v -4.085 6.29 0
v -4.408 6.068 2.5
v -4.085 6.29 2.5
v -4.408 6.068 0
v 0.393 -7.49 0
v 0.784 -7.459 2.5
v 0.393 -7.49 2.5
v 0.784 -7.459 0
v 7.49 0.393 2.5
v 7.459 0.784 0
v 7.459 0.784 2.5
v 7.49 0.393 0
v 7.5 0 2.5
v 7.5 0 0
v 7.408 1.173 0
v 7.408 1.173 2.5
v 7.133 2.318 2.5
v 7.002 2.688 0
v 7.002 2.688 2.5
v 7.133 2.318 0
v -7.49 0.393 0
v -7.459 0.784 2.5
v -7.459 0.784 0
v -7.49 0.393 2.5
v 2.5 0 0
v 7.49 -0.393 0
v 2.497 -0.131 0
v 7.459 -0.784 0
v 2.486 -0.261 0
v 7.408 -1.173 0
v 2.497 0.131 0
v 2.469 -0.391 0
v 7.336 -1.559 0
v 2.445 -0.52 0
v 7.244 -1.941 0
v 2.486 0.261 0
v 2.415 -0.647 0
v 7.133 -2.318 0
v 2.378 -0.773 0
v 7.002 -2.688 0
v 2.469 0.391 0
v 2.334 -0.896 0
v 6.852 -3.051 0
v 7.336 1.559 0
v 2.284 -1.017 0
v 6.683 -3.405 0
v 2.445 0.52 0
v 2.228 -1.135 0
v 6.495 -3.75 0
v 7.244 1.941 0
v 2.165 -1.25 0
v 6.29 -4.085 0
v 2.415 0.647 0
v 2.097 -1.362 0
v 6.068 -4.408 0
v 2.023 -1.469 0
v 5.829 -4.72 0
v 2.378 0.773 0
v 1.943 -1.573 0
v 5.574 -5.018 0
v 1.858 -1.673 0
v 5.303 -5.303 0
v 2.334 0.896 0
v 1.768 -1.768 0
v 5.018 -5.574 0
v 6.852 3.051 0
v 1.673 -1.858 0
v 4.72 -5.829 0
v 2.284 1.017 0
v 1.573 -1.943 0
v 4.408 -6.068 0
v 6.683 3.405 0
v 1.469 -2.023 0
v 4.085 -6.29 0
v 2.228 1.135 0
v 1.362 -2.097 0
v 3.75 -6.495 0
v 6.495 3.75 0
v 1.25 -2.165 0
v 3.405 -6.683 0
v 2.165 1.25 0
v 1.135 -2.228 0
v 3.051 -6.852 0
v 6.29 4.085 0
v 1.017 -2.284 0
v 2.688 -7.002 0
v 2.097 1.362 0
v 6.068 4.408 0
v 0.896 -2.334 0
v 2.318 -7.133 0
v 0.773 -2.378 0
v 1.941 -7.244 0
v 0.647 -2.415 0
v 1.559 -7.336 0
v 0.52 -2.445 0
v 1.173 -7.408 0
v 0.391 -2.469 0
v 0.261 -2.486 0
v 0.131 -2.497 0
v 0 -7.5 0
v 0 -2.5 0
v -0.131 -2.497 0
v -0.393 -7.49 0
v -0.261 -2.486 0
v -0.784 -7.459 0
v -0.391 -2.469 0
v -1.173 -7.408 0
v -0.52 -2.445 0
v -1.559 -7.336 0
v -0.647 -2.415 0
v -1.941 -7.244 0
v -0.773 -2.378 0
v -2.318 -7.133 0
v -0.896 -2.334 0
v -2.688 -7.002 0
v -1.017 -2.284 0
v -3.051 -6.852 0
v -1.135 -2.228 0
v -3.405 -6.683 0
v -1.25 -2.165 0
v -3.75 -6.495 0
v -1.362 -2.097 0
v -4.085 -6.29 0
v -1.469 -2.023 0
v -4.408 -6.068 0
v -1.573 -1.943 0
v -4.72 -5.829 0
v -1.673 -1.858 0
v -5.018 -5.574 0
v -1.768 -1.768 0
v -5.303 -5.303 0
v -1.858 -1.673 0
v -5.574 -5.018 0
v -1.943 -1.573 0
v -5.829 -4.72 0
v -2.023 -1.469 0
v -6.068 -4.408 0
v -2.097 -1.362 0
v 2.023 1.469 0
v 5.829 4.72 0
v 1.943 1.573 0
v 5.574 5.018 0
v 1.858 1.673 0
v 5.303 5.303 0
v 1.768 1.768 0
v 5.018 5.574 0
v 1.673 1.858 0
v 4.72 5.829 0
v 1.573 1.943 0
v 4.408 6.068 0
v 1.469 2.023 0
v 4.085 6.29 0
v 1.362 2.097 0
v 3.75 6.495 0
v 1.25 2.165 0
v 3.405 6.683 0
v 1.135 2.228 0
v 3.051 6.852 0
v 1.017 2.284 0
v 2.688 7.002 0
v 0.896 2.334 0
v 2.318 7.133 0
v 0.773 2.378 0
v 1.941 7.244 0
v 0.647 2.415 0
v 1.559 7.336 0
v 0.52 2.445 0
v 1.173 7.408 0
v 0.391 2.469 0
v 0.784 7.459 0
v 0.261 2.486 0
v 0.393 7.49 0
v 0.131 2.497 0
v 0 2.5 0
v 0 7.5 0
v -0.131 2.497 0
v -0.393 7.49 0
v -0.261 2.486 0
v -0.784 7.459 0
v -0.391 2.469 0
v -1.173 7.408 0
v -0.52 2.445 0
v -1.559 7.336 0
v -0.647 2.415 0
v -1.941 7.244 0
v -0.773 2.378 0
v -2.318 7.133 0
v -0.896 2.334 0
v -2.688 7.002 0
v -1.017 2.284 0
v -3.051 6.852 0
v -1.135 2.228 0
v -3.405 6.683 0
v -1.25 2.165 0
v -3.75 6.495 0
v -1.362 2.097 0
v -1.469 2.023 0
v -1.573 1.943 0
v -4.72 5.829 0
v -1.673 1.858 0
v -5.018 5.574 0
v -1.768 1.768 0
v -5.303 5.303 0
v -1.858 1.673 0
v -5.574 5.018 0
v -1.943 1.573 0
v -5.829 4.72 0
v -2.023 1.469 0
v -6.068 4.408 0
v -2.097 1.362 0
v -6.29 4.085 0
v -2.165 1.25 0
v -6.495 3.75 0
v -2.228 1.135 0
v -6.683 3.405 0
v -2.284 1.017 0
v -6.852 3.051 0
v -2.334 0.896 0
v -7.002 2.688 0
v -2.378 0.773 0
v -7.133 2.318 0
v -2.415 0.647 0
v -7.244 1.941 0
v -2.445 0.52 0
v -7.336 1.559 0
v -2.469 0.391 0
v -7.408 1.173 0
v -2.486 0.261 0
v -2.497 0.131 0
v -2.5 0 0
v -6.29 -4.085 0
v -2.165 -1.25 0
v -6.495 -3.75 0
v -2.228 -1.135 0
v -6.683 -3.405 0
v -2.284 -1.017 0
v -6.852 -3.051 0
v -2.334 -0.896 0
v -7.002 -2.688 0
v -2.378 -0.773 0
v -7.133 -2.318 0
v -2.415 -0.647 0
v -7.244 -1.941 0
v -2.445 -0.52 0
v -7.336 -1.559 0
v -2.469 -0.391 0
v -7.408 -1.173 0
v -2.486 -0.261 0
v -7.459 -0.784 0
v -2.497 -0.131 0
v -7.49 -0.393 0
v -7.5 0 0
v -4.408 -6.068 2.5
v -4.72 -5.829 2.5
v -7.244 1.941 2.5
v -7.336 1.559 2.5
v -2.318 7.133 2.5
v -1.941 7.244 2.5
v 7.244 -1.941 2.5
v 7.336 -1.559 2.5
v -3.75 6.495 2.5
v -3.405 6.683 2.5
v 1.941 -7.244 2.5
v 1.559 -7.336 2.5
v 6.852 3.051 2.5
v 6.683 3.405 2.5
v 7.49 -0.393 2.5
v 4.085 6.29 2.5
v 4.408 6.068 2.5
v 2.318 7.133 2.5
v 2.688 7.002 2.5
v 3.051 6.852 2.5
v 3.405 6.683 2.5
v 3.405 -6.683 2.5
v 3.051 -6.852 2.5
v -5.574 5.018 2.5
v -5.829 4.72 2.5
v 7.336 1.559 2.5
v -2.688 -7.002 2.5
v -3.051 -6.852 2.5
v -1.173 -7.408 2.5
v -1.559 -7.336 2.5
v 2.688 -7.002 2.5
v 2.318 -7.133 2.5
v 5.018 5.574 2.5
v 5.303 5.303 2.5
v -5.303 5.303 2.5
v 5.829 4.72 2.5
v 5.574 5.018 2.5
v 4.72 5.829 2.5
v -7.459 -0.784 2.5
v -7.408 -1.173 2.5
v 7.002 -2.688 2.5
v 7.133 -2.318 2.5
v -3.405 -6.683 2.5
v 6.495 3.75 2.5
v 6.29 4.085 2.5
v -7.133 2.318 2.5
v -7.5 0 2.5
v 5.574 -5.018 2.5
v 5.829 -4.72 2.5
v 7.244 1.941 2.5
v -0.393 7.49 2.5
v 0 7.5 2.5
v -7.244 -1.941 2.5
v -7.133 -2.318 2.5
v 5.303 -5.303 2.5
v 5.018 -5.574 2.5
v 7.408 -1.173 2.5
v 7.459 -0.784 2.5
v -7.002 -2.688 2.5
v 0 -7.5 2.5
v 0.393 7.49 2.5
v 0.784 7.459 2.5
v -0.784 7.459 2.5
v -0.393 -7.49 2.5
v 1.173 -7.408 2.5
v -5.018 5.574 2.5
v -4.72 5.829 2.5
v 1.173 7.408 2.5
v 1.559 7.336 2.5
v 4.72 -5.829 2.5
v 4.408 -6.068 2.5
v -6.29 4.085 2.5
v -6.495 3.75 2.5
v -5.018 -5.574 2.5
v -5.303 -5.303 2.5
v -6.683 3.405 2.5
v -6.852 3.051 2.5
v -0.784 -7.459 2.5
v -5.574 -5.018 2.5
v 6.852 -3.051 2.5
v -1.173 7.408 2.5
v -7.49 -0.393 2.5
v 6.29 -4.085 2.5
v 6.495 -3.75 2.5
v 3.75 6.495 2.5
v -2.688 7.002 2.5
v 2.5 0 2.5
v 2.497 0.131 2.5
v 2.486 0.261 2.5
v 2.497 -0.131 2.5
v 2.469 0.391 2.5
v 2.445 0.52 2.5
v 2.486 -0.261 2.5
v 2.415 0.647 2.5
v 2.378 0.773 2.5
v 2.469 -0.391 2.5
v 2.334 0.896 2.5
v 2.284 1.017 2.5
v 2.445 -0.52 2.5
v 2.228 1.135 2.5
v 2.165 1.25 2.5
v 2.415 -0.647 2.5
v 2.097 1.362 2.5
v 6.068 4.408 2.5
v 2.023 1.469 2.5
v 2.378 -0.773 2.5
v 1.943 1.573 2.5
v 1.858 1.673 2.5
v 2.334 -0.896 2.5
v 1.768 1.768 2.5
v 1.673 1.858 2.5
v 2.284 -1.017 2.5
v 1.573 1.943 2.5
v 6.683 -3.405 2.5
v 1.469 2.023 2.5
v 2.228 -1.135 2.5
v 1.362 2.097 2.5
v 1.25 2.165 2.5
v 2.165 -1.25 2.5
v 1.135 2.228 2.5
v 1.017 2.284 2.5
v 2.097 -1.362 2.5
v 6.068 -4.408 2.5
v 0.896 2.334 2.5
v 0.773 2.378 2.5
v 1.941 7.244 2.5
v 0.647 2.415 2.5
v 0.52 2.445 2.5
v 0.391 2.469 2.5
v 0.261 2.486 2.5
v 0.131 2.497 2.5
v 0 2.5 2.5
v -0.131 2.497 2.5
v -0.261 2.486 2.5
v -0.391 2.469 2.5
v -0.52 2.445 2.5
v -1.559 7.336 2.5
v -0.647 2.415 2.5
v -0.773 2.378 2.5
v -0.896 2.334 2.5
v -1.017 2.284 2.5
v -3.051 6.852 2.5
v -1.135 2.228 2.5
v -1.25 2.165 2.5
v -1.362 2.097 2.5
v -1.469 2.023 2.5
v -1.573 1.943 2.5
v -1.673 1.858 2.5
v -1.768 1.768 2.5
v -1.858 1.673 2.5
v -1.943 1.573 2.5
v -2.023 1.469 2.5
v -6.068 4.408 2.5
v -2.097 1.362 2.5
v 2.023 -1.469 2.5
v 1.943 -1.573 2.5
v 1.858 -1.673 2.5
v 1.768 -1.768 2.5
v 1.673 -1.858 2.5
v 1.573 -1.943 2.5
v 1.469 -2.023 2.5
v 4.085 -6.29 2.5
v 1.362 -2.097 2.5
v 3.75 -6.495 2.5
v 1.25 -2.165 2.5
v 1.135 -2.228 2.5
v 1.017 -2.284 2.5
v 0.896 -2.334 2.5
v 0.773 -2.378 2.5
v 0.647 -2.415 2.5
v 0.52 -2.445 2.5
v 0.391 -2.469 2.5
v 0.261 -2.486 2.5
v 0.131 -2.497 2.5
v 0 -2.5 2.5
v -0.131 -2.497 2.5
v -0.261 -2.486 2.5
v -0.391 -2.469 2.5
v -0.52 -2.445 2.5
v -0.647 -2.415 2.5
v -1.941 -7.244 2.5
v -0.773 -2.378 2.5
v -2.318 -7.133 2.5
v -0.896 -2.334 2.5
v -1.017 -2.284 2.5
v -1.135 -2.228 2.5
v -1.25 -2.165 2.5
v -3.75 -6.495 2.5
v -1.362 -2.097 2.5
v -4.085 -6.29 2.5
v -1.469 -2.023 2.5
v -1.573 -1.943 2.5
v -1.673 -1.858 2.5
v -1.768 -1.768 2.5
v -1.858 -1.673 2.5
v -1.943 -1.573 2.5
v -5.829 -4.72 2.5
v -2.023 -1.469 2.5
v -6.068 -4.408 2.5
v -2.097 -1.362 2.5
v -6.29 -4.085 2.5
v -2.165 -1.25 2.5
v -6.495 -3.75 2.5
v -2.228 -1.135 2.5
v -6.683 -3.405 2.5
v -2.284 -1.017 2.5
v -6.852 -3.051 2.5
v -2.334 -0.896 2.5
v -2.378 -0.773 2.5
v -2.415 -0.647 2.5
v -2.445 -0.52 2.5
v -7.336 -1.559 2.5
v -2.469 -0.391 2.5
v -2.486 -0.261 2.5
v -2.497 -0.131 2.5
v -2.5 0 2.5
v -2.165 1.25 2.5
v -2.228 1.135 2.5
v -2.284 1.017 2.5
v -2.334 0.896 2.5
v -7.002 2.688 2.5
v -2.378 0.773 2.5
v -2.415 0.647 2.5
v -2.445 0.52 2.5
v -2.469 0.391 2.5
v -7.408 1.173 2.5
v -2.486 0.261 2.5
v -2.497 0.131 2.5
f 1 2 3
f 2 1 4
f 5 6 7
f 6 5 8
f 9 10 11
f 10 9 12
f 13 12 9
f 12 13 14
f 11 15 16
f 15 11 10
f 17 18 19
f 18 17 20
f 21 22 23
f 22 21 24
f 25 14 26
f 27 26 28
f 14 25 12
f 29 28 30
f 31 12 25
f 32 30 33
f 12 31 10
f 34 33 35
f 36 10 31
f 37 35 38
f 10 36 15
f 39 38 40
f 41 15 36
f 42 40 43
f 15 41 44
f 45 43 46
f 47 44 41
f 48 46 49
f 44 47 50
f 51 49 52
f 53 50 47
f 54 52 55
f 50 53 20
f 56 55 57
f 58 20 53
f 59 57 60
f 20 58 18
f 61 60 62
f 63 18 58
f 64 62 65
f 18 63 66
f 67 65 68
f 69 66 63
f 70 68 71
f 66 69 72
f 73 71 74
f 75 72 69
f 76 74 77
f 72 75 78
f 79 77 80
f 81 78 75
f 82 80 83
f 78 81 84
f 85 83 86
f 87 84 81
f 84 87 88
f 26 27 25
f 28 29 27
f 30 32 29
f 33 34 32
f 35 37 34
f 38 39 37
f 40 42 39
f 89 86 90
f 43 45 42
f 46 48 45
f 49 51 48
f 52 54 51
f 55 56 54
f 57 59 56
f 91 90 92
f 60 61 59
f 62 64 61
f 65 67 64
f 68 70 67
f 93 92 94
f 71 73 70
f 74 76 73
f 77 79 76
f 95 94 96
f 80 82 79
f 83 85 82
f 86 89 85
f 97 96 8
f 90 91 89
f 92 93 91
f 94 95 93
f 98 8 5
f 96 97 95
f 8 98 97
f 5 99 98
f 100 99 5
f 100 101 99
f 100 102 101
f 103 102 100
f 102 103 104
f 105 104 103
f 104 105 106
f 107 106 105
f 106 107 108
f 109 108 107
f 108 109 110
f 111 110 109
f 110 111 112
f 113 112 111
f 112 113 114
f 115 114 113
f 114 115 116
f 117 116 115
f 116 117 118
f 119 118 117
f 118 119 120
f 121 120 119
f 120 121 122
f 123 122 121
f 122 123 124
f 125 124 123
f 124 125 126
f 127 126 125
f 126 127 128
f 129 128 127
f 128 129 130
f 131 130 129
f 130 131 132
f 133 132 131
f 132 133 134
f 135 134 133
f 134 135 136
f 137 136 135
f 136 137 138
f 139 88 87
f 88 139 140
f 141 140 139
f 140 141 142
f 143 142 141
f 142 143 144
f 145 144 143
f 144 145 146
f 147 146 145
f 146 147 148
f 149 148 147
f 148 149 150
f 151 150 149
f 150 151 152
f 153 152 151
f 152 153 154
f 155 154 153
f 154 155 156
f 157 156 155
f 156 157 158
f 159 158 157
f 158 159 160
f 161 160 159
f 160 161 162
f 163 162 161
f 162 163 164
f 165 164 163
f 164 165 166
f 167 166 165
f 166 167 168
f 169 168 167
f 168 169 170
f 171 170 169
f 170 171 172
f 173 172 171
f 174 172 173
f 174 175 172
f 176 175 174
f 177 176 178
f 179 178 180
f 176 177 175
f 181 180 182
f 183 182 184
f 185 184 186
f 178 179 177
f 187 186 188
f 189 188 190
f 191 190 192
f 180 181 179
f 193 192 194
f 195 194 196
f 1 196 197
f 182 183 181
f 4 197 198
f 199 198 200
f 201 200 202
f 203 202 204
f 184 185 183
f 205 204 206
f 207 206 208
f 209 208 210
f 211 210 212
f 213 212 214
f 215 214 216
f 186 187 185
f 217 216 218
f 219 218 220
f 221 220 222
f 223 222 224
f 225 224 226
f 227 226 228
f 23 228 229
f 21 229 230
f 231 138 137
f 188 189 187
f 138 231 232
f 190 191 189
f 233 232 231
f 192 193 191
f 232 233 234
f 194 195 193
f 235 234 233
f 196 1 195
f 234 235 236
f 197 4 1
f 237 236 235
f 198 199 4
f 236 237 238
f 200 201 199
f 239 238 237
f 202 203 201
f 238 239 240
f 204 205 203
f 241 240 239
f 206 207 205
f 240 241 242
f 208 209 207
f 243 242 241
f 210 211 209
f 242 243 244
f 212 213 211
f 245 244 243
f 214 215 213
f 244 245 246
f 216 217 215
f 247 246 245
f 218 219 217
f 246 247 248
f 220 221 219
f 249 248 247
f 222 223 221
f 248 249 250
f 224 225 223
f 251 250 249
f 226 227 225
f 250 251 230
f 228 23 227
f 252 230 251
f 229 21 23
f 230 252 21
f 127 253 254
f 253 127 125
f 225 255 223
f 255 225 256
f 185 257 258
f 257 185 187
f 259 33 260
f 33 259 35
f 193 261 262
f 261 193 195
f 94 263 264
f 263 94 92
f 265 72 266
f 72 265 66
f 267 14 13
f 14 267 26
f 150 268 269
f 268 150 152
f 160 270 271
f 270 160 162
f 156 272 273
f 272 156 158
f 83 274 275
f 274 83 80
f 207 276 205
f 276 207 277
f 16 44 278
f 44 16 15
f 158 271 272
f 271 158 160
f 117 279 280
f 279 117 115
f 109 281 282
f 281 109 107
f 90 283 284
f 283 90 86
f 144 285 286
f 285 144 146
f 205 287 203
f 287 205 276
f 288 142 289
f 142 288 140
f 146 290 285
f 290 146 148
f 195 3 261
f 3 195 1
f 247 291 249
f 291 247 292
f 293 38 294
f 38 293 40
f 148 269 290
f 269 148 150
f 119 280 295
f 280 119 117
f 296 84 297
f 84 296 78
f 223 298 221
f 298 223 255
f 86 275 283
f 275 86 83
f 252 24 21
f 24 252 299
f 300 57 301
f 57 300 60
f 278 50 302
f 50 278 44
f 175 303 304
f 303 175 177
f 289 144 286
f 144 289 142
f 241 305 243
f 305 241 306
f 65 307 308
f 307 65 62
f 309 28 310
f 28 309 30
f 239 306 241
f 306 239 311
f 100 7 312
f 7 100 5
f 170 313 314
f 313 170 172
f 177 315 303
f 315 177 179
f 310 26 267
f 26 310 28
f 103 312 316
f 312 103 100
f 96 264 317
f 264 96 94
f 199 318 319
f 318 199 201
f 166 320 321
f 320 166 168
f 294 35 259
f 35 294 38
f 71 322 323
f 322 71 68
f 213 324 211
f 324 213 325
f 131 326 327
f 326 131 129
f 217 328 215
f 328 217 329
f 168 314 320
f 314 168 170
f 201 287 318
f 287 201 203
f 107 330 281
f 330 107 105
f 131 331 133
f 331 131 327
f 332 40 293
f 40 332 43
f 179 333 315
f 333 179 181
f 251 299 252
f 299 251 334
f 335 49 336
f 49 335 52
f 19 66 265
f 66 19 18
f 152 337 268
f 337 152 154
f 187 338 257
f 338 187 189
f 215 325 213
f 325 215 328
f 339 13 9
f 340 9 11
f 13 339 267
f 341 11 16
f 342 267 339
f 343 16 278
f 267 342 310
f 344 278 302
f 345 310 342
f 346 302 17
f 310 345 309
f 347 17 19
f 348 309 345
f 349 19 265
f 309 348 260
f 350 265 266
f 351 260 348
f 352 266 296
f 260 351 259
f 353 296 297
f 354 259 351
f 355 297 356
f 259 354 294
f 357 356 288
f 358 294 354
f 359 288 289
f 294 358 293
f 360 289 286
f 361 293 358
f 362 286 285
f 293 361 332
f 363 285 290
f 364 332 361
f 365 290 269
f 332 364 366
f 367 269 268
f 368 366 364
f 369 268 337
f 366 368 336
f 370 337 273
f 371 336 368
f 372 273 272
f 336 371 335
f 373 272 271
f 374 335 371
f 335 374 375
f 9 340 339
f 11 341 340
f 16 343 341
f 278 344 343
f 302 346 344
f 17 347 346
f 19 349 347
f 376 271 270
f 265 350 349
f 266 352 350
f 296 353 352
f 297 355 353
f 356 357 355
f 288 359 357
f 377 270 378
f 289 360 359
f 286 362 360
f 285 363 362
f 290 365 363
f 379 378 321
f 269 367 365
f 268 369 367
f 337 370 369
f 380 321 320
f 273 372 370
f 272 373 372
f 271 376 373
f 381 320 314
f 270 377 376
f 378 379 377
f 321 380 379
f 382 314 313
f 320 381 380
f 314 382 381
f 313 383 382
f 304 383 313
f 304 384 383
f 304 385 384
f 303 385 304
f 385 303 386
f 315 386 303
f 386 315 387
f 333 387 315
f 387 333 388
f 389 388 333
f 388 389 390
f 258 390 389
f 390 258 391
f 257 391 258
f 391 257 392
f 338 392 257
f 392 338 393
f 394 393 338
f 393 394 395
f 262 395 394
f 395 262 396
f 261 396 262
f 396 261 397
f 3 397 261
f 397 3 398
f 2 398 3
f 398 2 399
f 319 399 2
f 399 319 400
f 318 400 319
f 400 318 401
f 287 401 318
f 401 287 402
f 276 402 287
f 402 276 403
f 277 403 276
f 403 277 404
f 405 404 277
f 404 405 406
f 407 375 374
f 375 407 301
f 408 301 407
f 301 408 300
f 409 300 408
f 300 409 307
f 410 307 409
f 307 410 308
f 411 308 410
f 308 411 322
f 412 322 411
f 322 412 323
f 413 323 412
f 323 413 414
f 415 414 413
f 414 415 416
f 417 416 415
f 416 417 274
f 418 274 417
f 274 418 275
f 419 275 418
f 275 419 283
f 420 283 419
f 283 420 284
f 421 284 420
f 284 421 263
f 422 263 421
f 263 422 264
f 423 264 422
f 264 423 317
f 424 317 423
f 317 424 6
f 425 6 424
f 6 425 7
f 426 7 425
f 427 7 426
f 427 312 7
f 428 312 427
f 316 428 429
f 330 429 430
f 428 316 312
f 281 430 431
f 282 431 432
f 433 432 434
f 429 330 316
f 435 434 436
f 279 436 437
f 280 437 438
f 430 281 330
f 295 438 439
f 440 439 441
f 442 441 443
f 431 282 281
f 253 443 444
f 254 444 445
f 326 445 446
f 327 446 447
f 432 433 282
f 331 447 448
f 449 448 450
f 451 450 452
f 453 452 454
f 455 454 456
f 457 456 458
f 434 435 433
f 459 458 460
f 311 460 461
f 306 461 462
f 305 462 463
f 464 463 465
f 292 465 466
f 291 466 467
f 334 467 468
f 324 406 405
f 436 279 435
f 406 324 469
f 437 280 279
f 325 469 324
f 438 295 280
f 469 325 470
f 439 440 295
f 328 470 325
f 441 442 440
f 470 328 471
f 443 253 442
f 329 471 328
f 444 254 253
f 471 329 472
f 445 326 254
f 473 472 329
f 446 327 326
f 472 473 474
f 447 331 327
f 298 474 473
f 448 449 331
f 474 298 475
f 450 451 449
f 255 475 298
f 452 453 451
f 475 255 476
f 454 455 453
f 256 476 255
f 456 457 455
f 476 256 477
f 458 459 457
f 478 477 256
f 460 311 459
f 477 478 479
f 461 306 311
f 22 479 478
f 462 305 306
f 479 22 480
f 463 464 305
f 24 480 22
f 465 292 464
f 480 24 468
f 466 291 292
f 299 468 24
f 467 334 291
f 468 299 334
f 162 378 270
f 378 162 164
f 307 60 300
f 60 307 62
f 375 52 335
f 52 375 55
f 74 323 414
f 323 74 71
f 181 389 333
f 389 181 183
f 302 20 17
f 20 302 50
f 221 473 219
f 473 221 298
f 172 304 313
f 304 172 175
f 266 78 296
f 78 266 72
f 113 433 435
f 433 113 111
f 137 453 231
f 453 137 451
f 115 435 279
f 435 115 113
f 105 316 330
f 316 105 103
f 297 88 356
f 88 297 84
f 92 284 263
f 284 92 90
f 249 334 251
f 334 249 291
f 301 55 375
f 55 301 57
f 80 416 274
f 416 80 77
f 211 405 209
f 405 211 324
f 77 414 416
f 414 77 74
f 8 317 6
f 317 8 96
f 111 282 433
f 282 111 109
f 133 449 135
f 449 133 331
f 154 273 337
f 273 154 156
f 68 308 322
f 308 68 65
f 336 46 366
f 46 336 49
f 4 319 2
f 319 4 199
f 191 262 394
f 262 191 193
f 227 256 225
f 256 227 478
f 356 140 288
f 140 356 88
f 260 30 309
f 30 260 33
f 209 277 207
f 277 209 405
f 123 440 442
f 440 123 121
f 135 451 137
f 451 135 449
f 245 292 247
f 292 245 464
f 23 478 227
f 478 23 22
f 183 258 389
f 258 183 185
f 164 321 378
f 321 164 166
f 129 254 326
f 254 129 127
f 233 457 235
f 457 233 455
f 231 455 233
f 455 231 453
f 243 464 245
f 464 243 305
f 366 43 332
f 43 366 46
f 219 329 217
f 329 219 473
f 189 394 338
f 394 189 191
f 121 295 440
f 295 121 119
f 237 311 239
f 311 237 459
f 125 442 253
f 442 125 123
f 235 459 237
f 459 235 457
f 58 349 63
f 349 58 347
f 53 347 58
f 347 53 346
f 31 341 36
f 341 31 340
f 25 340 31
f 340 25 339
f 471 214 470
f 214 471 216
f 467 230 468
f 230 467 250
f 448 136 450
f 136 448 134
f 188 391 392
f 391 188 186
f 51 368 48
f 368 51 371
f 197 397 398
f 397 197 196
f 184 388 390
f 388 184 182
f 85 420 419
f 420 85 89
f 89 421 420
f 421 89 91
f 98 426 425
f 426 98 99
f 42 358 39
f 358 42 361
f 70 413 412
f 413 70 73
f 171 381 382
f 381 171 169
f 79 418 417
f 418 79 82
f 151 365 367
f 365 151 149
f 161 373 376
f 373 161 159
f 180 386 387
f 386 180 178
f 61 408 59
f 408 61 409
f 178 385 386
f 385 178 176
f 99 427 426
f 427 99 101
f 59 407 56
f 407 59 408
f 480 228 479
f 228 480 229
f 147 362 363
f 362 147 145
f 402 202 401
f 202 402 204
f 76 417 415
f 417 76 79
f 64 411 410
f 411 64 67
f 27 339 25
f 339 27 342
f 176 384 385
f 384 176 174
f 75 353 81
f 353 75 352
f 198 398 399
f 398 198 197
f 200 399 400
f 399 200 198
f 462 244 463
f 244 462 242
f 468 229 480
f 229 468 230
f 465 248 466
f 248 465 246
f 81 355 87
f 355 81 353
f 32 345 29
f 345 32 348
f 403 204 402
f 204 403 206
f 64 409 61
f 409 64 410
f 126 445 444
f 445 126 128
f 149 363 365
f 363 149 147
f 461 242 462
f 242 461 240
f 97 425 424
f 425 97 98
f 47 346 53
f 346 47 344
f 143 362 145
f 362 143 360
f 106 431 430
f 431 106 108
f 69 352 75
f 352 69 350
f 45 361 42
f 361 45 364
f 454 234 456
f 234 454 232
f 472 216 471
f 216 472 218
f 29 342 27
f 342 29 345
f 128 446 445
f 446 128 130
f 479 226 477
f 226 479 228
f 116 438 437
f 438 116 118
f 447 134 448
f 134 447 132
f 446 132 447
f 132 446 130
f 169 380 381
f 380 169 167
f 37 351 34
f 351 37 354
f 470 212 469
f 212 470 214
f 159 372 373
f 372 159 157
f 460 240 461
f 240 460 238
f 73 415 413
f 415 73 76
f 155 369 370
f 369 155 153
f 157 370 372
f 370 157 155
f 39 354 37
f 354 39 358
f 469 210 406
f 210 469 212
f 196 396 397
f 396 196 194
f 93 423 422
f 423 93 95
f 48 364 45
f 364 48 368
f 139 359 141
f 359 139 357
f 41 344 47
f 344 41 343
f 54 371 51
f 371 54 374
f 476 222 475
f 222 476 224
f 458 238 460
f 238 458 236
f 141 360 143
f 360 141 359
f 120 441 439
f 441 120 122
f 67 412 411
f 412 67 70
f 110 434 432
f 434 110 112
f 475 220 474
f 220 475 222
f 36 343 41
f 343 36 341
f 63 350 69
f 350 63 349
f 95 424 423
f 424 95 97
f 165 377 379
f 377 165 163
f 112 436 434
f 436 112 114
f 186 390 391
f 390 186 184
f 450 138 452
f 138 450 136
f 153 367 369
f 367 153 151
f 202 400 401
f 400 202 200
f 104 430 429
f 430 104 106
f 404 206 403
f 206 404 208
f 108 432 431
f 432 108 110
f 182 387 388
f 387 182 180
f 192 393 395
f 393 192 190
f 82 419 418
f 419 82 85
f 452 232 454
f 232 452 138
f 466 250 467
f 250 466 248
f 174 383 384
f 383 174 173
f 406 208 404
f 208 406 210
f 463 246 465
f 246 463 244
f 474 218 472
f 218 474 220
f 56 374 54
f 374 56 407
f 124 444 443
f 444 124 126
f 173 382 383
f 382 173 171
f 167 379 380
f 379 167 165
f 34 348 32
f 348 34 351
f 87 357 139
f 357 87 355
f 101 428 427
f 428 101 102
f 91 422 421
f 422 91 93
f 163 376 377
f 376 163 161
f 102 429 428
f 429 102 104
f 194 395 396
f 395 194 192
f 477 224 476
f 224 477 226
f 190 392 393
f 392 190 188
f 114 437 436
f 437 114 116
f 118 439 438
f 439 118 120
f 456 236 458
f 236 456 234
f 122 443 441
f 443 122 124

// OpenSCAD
$fn=120;
max_d=15;
max_r=max_d/2;
bolt_d=5;
bolt_r=bolt_d/2;
flat_d=22;
flat_r=flat_d/2;
min_h=2.5;
max_h=2.5;
pad=0.1;
padd=pad*2;


difference() {
    cylinder(r=max_r,h=max_h);
    translate([0,0,-pad])
    cylinder(r=bolt_r,h=max_h+padd);
}
